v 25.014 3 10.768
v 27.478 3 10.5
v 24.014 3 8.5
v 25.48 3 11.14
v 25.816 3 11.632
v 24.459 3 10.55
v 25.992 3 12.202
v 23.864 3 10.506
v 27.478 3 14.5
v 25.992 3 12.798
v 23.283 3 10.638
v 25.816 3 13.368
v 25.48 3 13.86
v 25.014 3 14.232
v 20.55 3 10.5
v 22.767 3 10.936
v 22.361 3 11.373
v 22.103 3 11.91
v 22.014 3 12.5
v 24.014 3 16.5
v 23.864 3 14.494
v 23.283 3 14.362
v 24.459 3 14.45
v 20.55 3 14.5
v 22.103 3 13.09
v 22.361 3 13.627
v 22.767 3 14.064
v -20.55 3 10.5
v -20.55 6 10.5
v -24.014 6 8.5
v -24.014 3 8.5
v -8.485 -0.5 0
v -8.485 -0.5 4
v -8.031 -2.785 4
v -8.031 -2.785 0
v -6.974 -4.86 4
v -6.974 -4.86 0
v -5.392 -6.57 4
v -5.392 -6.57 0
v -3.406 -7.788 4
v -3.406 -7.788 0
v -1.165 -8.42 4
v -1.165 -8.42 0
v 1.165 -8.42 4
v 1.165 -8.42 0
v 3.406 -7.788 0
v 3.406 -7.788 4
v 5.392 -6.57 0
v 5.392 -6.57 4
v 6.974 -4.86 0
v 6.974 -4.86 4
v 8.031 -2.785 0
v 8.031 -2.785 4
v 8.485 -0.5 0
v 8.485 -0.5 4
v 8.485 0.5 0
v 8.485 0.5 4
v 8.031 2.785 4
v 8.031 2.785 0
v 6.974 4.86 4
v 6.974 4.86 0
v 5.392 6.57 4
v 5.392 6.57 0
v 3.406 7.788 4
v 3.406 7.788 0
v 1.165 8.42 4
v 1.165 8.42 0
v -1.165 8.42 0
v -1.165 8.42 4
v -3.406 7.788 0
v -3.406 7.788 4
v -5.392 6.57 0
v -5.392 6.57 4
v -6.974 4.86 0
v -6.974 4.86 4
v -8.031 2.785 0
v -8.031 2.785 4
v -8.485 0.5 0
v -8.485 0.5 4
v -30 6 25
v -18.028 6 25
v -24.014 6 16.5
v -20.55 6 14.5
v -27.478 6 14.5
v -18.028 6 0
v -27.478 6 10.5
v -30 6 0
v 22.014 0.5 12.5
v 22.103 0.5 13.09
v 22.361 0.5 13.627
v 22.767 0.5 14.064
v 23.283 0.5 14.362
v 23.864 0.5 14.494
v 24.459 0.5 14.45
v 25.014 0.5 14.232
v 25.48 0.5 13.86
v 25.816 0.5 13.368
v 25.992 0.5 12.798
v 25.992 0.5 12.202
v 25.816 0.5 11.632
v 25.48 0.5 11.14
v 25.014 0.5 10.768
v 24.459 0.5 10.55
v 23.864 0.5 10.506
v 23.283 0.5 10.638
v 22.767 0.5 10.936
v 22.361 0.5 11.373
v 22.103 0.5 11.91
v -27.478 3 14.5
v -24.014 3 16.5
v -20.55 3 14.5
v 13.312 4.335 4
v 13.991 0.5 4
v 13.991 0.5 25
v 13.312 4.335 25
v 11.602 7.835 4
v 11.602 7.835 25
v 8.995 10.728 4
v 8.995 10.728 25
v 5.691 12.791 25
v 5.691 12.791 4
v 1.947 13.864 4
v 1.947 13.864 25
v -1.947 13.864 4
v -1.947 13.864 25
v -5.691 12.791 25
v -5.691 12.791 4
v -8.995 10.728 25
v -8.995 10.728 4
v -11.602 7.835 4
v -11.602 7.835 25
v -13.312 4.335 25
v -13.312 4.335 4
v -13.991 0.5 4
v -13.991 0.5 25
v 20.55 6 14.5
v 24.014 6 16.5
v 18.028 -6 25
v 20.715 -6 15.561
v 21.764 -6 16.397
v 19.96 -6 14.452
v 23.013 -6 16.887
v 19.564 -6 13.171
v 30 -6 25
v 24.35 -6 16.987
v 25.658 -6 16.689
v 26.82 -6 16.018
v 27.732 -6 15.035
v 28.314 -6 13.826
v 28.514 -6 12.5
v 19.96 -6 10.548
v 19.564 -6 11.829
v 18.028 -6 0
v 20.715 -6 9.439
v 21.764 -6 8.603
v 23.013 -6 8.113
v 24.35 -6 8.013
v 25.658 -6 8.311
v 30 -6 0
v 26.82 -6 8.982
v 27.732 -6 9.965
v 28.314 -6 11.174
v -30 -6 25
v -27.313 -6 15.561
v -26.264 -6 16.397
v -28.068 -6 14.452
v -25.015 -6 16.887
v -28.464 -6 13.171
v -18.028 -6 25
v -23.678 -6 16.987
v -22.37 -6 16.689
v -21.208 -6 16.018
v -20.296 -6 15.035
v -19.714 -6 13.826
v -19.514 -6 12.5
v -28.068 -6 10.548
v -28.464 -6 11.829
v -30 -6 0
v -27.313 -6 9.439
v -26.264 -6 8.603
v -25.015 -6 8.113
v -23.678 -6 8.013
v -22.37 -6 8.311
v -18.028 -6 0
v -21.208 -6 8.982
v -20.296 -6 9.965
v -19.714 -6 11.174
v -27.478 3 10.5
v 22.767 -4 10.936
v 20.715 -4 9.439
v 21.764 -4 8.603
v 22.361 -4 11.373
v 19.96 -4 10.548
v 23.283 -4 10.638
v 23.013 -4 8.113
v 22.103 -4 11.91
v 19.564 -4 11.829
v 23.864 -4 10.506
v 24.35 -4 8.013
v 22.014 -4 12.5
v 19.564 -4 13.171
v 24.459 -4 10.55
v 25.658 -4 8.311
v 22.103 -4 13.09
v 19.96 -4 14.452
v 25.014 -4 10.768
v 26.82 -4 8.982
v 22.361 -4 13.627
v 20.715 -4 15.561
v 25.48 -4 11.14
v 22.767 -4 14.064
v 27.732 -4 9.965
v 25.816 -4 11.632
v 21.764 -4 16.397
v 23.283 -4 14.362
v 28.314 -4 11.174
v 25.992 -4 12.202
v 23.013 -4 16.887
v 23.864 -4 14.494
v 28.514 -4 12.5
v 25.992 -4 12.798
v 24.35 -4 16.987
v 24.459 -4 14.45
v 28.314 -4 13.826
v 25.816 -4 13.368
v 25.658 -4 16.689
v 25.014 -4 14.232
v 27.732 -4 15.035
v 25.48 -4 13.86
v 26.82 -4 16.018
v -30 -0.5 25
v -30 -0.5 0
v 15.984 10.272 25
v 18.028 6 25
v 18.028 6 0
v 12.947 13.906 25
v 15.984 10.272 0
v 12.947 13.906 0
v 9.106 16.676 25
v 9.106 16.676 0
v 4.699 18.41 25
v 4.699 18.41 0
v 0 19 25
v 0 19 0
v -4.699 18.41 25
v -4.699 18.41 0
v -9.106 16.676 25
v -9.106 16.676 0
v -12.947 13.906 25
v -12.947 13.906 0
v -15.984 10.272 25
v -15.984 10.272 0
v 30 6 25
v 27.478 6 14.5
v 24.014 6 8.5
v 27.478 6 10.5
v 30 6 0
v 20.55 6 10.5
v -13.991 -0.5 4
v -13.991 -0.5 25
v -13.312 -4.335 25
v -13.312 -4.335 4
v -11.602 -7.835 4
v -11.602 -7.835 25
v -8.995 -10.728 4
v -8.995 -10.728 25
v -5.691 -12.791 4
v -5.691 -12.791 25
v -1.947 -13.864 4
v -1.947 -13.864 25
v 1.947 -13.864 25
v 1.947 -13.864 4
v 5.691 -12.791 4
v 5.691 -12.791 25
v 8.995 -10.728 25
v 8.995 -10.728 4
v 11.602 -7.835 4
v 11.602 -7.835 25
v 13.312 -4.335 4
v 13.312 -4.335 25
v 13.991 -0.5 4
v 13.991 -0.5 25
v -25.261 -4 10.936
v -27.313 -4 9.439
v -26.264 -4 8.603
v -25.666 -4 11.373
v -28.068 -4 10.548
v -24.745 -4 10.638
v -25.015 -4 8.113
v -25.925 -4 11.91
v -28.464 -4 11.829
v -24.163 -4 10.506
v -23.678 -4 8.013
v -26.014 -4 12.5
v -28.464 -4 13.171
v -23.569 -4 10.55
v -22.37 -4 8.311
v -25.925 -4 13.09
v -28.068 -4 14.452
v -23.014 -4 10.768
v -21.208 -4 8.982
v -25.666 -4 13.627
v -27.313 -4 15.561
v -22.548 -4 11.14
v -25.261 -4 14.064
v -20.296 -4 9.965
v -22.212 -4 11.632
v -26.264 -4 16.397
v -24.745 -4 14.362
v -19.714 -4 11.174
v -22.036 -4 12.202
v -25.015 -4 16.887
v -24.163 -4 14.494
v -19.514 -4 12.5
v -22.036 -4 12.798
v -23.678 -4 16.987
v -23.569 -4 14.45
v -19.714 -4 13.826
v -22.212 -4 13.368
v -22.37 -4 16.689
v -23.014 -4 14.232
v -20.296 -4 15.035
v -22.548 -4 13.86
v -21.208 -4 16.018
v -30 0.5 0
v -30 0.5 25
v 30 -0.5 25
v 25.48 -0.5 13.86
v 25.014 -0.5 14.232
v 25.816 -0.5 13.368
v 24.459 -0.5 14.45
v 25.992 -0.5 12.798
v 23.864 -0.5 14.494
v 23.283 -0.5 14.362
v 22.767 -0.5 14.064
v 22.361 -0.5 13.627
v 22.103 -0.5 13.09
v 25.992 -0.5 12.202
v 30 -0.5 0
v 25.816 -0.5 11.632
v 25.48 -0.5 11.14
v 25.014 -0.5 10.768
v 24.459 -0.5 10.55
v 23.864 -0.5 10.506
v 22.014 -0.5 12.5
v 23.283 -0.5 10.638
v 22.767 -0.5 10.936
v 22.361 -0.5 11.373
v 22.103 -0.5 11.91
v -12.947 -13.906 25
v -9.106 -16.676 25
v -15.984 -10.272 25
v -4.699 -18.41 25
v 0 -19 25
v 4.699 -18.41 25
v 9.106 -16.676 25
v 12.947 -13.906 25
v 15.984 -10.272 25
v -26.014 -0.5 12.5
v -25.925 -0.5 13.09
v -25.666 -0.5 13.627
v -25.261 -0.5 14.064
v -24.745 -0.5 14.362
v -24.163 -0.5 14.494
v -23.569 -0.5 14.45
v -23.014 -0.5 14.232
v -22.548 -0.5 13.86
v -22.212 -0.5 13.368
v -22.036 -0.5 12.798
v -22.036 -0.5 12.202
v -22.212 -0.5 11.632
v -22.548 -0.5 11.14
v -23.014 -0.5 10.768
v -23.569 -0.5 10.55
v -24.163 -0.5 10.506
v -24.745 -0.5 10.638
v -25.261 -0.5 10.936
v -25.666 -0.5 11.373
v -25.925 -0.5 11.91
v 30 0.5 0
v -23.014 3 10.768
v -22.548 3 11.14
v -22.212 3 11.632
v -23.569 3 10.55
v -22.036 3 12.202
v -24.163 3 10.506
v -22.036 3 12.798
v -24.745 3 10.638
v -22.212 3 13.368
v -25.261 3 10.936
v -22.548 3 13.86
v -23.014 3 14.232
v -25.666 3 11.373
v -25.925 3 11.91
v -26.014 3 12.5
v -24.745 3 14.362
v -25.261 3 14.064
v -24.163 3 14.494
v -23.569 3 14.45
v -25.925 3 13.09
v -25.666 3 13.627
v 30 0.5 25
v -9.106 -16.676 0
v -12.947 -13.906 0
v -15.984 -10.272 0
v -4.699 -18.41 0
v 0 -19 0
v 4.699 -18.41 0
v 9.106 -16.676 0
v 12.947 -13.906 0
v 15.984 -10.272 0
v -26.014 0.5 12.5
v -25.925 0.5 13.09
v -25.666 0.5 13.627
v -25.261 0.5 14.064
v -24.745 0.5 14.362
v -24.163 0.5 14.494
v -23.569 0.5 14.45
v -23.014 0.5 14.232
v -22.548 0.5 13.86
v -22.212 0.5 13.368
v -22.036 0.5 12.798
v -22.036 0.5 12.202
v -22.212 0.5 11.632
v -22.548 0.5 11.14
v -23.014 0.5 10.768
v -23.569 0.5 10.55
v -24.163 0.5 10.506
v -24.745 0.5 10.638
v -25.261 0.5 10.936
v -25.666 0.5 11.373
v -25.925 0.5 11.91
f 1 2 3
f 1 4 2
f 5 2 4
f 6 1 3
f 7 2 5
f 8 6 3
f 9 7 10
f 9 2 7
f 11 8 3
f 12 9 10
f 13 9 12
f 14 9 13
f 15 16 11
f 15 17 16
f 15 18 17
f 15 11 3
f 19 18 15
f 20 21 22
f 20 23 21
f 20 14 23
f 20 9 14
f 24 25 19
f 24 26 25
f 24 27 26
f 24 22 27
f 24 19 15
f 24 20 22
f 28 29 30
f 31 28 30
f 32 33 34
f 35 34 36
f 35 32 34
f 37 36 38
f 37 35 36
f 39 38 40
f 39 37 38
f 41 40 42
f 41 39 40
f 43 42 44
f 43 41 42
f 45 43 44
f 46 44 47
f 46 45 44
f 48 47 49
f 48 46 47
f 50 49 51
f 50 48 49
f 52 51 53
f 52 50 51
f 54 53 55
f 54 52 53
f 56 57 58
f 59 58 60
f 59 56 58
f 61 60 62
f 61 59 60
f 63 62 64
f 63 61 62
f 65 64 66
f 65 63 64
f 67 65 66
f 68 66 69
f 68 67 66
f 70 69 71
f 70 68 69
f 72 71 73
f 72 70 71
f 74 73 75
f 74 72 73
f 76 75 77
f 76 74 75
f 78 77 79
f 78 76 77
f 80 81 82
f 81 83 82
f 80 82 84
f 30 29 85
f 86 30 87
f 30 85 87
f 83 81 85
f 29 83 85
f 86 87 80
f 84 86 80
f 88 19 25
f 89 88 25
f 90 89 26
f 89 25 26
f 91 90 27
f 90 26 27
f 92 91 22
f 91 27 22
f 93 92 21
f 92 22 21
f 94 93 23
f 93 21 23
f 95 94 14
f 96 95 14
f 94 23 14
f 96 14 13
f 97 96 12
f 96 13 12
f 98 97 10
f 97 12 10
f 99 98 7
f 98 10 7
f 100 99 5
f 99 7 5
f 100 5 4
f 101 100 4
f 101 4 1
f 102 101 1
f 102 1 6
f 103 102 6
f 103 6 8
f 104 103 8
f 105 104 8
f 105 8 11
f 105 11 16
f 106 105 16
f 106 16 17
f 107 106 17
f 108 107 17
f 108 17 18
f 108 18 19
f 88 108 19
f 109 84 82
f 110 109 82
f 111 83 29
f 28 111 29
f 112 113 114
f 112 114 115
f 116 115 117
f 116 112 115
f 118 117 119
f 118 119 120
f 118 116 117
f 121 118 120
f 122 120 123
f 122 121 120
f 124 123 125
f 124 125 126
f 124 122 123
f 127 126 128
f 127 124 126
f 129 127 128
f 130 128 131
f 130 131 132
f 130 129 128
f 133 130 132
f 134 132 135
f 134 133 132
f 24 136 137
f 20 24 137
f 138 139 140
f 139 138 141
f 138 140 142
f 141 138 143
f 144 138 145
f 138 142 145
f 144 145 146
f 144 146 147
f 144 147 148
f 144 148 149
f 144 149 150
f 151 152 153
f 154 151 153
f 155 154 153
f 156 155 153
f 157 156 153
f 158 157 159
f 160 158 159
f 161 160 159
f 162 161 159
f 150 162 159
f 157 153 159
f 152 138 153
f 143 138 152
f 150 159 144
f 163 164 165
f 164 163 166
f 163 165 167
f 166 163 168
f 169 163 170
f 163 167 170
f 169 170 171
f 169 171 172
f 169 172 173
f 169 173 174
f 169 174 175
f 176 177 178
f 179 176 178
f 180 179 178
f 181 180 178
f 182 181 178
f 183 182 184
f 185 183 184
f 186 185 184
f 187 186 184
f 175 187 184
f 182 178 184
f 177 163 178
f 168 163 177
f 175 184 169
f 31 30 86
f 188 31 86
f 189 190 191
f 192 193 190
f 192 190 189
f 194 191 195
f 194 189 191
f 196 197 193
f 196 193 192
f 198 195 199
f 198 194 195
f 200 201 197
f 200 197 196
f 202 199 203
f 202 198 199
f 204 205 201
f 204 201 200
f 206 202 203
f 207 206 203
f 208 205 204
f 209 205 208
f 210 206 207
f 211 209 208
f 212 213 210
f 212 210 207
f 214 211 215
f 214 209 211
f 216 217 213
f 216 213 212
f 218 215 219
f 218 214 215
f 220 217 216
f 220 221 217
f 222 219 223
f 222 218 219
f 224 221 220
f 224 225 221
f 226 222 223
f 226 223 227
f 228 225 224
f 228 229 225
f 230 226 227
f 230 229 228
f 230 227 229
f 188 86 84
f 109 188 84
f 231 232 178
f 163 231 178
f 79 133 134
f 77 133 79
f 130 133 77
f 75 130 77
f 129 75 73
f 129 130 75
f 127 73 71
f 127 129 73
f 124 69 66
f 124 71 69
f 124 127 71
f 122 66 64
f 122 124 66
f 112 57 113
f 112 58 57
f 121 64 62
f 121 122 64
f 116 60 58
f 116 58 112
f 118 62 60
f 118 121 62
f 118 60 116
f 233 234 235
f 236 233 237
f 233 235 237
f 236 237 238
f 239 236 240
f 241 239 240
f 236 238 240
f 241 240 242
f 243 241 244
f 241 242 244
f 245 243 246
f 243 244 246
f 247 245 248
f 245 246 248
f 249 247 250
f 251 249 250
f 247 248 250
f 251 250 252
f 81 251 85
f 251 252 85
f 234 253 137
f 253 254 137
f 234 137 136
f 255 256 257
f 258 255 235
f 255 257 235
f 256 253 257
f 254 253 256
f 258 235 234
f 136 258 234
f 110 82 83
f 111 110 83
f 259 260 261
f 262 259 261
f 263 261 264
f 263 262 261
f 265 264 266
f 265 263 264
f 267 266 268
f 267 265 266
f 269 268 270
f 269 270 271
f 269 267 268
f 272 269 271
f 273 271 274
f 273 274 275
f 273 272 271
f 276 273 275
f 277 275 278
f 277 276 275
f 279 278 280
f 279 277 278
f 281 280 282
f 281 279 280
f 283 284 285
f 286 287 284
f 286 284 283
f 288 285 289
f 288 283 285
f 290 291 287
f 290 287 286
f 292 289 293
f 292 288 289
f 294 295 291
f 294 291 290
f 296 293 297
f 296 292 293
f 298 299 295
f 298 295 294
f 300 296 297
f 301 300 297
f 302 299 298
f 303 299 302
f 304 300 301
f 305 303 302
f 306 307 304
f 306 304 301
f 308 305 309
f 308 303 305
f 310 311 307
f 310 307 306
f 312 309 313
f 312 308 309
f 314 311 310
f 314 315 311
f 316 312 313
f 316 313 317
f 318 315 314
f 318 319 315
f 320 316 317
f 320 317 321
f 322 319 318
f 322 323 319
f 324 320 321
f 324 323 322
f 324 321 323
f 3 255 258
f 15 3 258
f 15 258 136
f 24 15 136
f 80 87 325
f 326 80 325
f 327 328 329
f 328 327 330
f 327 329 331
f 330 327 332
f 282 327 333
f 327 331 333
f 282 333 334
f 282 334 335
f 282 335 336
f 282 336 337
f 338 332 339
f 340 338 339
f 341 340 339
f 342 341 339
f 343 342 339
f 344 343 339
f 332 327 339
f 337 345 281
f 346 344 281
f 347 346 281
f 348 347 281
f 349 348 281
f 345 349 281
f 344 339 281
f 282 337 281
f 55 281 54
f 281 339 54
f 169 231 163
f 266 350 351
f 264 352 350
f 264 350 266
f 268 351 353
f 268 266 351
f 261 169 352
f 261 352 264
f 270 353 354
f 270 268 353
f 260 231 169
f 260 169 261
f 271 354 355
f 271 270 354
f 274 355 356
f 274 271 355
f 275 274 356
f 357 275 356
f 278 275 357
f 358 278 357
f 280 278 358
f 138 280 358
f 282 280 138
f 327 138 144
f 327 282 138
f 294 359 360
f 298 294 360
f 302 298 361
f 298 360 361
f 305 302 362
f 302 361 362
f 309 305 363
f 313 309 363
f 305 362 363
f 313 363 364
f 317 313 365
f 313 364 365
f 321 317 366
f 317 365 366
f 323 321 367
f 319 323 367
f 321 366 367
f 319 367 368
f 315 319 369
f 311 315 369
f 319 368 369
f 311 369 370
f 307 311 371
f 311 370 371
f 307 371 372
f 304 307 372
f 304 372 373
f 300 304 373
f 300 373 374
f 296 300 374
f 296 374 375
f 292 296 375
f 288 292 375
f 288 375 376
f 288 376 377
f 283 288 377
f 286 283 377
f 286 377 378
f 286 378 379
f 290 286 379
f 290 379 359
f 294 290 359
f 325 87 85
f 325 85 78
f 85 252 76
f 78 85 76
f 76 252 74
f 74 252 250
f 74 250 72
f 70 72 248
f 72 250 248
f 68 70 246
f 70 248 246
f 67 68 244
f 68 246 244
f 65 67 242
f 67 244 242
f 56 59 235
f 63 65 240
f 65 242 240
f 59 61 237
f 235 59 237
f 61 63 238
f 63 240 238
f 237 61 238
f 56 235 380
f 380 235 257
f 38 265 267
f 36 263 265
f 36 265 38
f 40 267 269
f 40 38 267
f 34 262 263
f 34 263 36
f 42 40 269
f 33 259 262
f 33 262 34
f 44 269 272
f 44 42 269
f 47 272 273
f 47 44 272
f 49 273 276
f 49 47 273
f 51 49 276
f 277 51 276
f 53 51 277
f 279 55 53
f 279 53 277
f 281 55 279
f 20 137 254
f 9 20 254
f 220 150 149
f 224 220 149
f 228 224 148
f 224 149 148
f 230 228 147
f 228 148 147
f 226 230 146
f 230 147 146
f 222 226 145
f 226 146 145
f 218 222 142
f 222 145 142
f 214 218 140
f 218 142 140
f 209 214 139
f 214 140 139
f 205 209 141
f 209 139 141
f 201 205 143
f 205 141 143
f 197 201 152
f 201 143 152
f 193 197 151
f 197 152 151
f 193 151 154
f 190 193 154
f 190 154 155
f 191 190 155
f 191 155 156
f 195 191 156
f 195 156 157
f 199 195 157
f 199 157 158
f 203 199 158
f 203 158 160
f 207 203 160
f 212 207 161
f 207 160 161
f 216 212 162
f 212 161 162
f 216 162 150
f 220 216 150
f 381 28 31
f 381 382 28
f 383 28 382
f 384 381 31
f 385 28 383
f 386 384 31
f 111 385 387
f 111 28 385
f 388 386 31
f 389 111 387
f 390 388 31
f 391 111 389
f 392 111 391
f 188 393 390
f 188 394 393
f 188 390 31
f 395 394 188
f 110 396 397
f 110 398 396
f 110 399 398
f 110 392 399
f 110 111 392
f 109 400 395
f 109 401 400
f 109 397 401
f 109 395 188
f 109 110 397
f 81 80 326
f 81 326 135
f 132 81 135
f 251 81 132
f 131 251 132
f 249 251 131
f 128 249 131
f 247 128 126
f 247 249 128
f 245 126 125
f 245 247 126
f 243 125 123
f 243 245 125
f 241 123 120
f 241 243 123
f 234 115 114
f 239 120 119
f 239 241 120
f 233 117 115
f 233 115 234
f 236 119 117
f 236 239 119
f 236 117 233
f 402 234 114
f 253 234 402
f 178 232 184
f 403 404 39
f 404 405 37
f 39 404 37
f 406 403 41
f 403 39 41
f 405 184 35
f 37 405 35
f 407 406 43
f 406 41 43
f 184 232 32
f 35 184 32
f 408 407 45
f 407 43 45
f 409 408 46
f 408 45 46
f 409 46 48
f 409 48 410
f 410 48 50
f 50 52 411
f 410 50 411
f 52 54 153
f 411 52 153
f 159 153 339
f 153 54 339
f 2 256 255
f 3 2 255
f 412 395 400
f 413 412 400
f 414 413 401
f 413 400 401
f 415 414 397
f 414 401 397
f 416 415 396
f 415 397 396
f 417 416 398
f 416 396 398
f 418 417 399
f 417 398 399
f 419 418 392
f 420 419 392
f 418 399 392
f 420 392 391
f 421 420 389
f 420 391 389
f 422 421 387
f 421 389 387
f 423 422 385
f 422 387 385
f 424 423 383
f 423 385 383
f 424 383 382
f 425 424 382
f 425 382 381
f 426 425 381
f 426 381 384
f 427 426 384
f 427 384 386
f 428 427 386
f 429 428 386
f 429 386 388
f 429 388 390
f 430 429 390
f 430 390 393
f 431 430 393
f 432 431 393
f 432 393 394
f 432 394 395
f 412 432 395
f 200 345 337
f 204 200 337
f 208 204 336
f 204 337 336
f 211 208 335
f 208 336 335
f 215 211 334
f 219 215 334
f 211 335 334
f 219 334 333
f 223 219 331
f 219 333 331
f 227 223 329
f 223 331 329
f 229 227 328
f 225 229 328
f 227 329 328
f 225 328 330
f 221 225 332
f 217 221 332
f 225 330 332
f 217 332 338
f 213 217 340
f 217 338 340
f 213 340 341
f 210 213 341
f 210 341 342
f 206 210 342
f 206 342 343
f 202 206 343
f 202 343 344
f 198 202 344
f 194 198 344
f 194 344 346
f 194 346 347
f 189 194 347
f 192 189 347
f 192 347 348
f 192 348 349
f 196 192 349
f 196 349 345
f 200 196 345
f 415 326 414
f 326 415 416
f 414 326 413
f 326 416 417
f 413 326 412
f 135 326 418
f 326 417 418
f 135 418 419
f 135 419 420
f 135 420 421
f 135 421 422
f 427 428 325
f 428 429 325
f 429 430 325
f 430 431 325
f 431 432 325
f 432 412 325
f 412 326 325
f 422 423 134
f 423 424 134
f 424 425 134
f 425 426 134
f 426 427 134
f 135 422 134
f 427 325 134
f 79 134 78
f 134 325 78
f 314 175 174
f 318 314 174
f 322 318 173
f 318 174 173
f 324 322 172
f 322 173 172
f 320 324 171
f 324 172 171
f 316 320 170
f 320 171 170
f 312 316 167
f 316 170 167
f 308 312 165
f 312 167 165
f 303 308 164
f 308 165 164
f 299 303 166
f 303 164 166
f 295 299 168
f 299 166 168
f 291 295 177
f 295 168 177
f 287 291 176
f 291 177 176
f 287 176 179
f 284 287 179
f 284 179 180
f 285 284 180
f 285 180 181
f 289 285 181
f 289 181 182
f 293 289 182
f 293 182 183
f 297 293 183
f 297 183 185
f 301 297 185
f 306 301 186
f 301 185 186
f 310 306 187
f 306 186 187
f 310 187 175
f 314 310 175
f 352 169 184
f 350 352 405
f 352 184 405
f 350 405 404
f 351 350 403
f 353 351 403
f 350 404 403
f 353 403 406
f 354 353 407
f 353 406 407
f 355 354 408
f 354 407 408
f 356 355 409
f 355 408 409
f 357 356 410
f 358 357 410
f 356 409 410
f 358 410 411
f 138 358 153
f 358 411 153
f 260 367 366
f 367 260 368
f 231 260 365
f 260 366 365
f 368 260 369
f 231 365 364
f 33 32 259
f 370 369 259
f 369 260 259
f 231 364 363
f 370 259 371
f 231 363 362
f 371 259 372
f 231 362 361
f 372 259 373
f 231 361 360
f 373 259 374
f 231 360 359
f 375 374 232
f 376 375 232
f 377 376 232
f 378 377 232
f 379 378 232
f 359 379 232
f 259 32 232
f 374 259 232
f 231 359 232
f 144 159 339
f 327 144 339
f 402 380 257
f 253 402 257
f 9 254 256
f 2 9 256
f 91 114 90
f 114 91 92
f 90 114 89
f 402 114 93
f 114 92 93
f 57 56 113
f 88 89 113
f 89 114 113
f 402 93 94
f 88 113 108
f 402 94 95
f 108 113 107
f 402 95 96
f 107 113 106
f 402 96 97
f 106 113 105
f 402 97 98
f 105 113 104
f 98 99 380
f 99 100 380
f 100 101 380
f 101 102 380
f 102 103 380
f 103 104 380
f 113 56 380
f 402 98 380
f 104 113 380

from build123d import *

# Parameters (mm, degrees)
F0_R     = 14
F1_DEPTH = 25
F0_R_2   = 8.5
F2_DEPTH = 4
F3_R     = 2
F4_DEPTH = 25
F5_DEPTH = 3
F6_R     = 4.5
F6_R_2   = 2
F7_DEPTH = 2
F9_DEPTH = 30


with BuildPart() as f1:
    # F0 (on Top) → F1 (new body)
    with BuildSketch(Plane.XY):
        with BuildLine():
            Line((-30, -6), (-18.027756, -6))
            ThreePointArc((-18.027756, -6), (0, -19), (18.027756, -6))
            Line((18.027756, -6), (30, -6))
            Line((30, -6), (30, 6))
            Line((30, 6), (18.027756, 6))
            ThreePointArc((18.027756, 6), (0, 19), (-18.027756, 6))
            Line((-18.027756, 6), (-30, 6))
            Line((-30, 6), (-30, -6))
        make_face()
        Circle(F0_R, mode=Mode.SUBTRACT)
    extrude(amount=F1_DEPTH)

    # F0 (on Top) → F2 (join)
    with BuildSketch(Plane.XY):
        Circle(F0_R)
        Circle(F0_R_2, mode=Mode.SUBTRACT)
    extrude(amount=F2_DEPTH)

    # F3 (on face) → F4 (cut)
    with BuildSketch(Plane(origin=(0, 6, 0), x_dir=(-1, 0, 0), z_dir=(0, 1, 0))):
        with Locations((-24.013878, 12.5)):
            Circle(F3_R)
        with Locations((24.013878, 12.5)):
            Circle(F3_R)
    extrude(amount=-F4_DEPTH, mode=Mode.SUBTRACT)

    # F3 (on face) → F5 (cut)
    with BuildSketch(Plane(origin=(0, 6, 0), x_dir=(-1, 0, 0), z_dir=(0, 1, 0))):
        Polygon((-27.47798, 10.5), (-24.013878, 8.5), (-20.549777, 10.5), (-20.549777, 14.5), (-24.013878, 16.5), (-27.47798, 14.5), align=None)
        with Locations((-24.013878, 12.5)):
            Circle(F3_R, mode=Mode.SUBTRACT)
        Polygon((20.549777, 10.5), (24.013878, 8.5), (27.47798, 10.5), (27.47798, 14.5), (24.013878, 16.5), (20.549777, 14.5), align=None)
        with Locations((24.013878, 12.5)):
            Circle(F3_R, mode=Mode.SUBTRACT)
    extrude(amount=-F5_DEPTH, mode=Mode.SUBTRACT)

    # F6 (on face) → F7 (cut)
    with BuildSketch(Plane.XZ.offset(6)):
        with Locations((-24.013878, 12.5)):
            Circle(F6_R)
        with Locations((-24.013878, 12.5)):
            Circle(F6_R_2, mode=Mode.SUBTRACT)
        with Locations((24.013878, 12.5)):
            Circle(F6_R)
    extrude(amount=-F7_DEPTH, mode=Mode.SUBTRACT)

    # F8 (on face) → F9 (cut)
    with BuildSketch(Plane(origin=(0, 0, 0), x_dir=(1, 0, 0), z_dir=(0, 0, -1))):
        with BuildLine():
            Line((-30, -0.5), (-8.5, -0.5))
            Line((-8.5, -0.5), (-8.485281, -0.5))
            ThreePointArc((-8.485281, -0.5), (-8.5, 0), (-8.485281, 0.5))
            Line((-8.485281, 0.5), (-30, 0.5))
            Line((-30, 0.5), (-30, -0.5))
        make_face()
        with BuildLine():
            ThreePointArc((8.5, 0), (8.49632, -0.250108), (8.485281, -0.5))
            Line((8.485281, -0.5), (30, -0.5))
            Line((30, -0.5), (30, 0.5))
            Line((30, 0.5), (8.5, 0.5))
            Line((8.5, 0.5), (8.485281, 0.5))
            ThreePointArc((8.485281, 0.5), (8.49632, 0.250108), (8.5, 0))
        make_face()
    extrude(amount=-F9_DEPTH, mode=Mode.SUBTRACT)


solid = f1.part
